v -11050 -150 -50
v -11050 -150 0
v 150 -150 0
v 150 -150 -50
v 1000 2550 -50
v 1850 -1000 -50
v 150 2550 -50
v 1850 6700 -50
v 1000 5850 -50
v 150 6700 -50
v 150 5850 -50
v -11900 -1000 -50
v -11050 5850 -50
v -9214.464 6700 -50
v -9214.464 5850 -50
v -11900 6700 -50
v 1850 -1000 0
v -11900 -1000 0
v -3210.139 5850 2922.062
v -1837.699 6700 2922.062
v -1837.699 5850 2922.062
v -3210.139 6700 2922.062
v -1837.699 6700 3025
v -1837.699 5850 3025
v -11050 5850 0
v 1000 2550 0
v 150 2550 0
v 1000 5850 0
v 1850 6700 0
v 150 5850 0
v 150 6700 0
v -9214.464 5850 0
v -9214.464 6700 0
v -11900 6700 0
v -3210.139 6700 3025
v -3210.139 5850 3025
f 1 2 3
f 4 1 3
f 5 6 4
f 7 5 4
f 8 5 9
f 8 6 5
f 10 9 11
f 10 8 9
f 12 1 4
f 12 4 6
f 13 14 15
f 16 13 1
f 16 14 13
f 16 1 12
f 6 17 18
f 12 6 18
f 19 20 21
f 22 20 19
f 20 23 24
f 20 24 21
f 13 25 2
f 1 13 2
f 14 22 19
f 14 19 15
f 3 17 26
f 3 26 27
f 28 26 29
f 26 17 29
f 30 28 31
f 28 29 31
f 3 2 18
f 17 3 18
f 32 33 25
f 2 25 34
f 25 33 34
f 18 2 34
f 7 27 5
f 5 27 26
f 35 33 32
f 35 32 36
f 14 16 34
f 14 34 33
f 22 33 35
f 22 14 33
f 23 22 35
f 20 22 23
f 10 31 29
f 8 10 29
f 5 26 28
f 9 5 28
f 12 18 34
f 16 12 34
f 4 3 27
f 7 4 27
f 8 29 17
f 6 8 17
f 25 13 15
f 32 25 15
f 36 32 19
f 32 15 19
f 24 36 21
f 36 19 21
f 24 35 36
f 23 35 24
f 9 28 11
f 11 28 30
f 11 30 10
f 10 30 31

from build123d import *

# Parameters (mm, degrees)
EXTRUDE1_DEPTH = 50
EXTRUDE2_DEPTH = 850


with BuildPart() as part:
    # Sketch1 → Extrude1 (new body)
    with BuildSketch(Plane.XY):
        Polygon((-9214.463982447, 6700), (-9214.463982447, 5850), (-11050, 5850), (-11050, -150), (150, -150), (150, 2550), (1000, 2550), (1000, 5850), (150, 5850), (150, 6700), (1850, 6700), (1850, -1000), (-11900, -1000), (-11900, 6700), align=None)
    extrude(amount=-EXTRUDE1_DEPTH)

    # Sketch2 → Extrude2 (add)
    with BuildSketch(Plane(origin=(0, 6700, 0), x_dir=(1, 0, 0), z_dir=(0, 1, 0))):
        Polygon((-9214.463982447, 0), (-3210.139096843, -3025), (-1837.698532175, -3025), (-1837.698532175, -2922.061836858), (-3210.139096843, -2922.061836858), (-9214.463982447, 50), align=None)
    extrude(amount=-EXTRUDE2_DEPTH)


solid = part.part
